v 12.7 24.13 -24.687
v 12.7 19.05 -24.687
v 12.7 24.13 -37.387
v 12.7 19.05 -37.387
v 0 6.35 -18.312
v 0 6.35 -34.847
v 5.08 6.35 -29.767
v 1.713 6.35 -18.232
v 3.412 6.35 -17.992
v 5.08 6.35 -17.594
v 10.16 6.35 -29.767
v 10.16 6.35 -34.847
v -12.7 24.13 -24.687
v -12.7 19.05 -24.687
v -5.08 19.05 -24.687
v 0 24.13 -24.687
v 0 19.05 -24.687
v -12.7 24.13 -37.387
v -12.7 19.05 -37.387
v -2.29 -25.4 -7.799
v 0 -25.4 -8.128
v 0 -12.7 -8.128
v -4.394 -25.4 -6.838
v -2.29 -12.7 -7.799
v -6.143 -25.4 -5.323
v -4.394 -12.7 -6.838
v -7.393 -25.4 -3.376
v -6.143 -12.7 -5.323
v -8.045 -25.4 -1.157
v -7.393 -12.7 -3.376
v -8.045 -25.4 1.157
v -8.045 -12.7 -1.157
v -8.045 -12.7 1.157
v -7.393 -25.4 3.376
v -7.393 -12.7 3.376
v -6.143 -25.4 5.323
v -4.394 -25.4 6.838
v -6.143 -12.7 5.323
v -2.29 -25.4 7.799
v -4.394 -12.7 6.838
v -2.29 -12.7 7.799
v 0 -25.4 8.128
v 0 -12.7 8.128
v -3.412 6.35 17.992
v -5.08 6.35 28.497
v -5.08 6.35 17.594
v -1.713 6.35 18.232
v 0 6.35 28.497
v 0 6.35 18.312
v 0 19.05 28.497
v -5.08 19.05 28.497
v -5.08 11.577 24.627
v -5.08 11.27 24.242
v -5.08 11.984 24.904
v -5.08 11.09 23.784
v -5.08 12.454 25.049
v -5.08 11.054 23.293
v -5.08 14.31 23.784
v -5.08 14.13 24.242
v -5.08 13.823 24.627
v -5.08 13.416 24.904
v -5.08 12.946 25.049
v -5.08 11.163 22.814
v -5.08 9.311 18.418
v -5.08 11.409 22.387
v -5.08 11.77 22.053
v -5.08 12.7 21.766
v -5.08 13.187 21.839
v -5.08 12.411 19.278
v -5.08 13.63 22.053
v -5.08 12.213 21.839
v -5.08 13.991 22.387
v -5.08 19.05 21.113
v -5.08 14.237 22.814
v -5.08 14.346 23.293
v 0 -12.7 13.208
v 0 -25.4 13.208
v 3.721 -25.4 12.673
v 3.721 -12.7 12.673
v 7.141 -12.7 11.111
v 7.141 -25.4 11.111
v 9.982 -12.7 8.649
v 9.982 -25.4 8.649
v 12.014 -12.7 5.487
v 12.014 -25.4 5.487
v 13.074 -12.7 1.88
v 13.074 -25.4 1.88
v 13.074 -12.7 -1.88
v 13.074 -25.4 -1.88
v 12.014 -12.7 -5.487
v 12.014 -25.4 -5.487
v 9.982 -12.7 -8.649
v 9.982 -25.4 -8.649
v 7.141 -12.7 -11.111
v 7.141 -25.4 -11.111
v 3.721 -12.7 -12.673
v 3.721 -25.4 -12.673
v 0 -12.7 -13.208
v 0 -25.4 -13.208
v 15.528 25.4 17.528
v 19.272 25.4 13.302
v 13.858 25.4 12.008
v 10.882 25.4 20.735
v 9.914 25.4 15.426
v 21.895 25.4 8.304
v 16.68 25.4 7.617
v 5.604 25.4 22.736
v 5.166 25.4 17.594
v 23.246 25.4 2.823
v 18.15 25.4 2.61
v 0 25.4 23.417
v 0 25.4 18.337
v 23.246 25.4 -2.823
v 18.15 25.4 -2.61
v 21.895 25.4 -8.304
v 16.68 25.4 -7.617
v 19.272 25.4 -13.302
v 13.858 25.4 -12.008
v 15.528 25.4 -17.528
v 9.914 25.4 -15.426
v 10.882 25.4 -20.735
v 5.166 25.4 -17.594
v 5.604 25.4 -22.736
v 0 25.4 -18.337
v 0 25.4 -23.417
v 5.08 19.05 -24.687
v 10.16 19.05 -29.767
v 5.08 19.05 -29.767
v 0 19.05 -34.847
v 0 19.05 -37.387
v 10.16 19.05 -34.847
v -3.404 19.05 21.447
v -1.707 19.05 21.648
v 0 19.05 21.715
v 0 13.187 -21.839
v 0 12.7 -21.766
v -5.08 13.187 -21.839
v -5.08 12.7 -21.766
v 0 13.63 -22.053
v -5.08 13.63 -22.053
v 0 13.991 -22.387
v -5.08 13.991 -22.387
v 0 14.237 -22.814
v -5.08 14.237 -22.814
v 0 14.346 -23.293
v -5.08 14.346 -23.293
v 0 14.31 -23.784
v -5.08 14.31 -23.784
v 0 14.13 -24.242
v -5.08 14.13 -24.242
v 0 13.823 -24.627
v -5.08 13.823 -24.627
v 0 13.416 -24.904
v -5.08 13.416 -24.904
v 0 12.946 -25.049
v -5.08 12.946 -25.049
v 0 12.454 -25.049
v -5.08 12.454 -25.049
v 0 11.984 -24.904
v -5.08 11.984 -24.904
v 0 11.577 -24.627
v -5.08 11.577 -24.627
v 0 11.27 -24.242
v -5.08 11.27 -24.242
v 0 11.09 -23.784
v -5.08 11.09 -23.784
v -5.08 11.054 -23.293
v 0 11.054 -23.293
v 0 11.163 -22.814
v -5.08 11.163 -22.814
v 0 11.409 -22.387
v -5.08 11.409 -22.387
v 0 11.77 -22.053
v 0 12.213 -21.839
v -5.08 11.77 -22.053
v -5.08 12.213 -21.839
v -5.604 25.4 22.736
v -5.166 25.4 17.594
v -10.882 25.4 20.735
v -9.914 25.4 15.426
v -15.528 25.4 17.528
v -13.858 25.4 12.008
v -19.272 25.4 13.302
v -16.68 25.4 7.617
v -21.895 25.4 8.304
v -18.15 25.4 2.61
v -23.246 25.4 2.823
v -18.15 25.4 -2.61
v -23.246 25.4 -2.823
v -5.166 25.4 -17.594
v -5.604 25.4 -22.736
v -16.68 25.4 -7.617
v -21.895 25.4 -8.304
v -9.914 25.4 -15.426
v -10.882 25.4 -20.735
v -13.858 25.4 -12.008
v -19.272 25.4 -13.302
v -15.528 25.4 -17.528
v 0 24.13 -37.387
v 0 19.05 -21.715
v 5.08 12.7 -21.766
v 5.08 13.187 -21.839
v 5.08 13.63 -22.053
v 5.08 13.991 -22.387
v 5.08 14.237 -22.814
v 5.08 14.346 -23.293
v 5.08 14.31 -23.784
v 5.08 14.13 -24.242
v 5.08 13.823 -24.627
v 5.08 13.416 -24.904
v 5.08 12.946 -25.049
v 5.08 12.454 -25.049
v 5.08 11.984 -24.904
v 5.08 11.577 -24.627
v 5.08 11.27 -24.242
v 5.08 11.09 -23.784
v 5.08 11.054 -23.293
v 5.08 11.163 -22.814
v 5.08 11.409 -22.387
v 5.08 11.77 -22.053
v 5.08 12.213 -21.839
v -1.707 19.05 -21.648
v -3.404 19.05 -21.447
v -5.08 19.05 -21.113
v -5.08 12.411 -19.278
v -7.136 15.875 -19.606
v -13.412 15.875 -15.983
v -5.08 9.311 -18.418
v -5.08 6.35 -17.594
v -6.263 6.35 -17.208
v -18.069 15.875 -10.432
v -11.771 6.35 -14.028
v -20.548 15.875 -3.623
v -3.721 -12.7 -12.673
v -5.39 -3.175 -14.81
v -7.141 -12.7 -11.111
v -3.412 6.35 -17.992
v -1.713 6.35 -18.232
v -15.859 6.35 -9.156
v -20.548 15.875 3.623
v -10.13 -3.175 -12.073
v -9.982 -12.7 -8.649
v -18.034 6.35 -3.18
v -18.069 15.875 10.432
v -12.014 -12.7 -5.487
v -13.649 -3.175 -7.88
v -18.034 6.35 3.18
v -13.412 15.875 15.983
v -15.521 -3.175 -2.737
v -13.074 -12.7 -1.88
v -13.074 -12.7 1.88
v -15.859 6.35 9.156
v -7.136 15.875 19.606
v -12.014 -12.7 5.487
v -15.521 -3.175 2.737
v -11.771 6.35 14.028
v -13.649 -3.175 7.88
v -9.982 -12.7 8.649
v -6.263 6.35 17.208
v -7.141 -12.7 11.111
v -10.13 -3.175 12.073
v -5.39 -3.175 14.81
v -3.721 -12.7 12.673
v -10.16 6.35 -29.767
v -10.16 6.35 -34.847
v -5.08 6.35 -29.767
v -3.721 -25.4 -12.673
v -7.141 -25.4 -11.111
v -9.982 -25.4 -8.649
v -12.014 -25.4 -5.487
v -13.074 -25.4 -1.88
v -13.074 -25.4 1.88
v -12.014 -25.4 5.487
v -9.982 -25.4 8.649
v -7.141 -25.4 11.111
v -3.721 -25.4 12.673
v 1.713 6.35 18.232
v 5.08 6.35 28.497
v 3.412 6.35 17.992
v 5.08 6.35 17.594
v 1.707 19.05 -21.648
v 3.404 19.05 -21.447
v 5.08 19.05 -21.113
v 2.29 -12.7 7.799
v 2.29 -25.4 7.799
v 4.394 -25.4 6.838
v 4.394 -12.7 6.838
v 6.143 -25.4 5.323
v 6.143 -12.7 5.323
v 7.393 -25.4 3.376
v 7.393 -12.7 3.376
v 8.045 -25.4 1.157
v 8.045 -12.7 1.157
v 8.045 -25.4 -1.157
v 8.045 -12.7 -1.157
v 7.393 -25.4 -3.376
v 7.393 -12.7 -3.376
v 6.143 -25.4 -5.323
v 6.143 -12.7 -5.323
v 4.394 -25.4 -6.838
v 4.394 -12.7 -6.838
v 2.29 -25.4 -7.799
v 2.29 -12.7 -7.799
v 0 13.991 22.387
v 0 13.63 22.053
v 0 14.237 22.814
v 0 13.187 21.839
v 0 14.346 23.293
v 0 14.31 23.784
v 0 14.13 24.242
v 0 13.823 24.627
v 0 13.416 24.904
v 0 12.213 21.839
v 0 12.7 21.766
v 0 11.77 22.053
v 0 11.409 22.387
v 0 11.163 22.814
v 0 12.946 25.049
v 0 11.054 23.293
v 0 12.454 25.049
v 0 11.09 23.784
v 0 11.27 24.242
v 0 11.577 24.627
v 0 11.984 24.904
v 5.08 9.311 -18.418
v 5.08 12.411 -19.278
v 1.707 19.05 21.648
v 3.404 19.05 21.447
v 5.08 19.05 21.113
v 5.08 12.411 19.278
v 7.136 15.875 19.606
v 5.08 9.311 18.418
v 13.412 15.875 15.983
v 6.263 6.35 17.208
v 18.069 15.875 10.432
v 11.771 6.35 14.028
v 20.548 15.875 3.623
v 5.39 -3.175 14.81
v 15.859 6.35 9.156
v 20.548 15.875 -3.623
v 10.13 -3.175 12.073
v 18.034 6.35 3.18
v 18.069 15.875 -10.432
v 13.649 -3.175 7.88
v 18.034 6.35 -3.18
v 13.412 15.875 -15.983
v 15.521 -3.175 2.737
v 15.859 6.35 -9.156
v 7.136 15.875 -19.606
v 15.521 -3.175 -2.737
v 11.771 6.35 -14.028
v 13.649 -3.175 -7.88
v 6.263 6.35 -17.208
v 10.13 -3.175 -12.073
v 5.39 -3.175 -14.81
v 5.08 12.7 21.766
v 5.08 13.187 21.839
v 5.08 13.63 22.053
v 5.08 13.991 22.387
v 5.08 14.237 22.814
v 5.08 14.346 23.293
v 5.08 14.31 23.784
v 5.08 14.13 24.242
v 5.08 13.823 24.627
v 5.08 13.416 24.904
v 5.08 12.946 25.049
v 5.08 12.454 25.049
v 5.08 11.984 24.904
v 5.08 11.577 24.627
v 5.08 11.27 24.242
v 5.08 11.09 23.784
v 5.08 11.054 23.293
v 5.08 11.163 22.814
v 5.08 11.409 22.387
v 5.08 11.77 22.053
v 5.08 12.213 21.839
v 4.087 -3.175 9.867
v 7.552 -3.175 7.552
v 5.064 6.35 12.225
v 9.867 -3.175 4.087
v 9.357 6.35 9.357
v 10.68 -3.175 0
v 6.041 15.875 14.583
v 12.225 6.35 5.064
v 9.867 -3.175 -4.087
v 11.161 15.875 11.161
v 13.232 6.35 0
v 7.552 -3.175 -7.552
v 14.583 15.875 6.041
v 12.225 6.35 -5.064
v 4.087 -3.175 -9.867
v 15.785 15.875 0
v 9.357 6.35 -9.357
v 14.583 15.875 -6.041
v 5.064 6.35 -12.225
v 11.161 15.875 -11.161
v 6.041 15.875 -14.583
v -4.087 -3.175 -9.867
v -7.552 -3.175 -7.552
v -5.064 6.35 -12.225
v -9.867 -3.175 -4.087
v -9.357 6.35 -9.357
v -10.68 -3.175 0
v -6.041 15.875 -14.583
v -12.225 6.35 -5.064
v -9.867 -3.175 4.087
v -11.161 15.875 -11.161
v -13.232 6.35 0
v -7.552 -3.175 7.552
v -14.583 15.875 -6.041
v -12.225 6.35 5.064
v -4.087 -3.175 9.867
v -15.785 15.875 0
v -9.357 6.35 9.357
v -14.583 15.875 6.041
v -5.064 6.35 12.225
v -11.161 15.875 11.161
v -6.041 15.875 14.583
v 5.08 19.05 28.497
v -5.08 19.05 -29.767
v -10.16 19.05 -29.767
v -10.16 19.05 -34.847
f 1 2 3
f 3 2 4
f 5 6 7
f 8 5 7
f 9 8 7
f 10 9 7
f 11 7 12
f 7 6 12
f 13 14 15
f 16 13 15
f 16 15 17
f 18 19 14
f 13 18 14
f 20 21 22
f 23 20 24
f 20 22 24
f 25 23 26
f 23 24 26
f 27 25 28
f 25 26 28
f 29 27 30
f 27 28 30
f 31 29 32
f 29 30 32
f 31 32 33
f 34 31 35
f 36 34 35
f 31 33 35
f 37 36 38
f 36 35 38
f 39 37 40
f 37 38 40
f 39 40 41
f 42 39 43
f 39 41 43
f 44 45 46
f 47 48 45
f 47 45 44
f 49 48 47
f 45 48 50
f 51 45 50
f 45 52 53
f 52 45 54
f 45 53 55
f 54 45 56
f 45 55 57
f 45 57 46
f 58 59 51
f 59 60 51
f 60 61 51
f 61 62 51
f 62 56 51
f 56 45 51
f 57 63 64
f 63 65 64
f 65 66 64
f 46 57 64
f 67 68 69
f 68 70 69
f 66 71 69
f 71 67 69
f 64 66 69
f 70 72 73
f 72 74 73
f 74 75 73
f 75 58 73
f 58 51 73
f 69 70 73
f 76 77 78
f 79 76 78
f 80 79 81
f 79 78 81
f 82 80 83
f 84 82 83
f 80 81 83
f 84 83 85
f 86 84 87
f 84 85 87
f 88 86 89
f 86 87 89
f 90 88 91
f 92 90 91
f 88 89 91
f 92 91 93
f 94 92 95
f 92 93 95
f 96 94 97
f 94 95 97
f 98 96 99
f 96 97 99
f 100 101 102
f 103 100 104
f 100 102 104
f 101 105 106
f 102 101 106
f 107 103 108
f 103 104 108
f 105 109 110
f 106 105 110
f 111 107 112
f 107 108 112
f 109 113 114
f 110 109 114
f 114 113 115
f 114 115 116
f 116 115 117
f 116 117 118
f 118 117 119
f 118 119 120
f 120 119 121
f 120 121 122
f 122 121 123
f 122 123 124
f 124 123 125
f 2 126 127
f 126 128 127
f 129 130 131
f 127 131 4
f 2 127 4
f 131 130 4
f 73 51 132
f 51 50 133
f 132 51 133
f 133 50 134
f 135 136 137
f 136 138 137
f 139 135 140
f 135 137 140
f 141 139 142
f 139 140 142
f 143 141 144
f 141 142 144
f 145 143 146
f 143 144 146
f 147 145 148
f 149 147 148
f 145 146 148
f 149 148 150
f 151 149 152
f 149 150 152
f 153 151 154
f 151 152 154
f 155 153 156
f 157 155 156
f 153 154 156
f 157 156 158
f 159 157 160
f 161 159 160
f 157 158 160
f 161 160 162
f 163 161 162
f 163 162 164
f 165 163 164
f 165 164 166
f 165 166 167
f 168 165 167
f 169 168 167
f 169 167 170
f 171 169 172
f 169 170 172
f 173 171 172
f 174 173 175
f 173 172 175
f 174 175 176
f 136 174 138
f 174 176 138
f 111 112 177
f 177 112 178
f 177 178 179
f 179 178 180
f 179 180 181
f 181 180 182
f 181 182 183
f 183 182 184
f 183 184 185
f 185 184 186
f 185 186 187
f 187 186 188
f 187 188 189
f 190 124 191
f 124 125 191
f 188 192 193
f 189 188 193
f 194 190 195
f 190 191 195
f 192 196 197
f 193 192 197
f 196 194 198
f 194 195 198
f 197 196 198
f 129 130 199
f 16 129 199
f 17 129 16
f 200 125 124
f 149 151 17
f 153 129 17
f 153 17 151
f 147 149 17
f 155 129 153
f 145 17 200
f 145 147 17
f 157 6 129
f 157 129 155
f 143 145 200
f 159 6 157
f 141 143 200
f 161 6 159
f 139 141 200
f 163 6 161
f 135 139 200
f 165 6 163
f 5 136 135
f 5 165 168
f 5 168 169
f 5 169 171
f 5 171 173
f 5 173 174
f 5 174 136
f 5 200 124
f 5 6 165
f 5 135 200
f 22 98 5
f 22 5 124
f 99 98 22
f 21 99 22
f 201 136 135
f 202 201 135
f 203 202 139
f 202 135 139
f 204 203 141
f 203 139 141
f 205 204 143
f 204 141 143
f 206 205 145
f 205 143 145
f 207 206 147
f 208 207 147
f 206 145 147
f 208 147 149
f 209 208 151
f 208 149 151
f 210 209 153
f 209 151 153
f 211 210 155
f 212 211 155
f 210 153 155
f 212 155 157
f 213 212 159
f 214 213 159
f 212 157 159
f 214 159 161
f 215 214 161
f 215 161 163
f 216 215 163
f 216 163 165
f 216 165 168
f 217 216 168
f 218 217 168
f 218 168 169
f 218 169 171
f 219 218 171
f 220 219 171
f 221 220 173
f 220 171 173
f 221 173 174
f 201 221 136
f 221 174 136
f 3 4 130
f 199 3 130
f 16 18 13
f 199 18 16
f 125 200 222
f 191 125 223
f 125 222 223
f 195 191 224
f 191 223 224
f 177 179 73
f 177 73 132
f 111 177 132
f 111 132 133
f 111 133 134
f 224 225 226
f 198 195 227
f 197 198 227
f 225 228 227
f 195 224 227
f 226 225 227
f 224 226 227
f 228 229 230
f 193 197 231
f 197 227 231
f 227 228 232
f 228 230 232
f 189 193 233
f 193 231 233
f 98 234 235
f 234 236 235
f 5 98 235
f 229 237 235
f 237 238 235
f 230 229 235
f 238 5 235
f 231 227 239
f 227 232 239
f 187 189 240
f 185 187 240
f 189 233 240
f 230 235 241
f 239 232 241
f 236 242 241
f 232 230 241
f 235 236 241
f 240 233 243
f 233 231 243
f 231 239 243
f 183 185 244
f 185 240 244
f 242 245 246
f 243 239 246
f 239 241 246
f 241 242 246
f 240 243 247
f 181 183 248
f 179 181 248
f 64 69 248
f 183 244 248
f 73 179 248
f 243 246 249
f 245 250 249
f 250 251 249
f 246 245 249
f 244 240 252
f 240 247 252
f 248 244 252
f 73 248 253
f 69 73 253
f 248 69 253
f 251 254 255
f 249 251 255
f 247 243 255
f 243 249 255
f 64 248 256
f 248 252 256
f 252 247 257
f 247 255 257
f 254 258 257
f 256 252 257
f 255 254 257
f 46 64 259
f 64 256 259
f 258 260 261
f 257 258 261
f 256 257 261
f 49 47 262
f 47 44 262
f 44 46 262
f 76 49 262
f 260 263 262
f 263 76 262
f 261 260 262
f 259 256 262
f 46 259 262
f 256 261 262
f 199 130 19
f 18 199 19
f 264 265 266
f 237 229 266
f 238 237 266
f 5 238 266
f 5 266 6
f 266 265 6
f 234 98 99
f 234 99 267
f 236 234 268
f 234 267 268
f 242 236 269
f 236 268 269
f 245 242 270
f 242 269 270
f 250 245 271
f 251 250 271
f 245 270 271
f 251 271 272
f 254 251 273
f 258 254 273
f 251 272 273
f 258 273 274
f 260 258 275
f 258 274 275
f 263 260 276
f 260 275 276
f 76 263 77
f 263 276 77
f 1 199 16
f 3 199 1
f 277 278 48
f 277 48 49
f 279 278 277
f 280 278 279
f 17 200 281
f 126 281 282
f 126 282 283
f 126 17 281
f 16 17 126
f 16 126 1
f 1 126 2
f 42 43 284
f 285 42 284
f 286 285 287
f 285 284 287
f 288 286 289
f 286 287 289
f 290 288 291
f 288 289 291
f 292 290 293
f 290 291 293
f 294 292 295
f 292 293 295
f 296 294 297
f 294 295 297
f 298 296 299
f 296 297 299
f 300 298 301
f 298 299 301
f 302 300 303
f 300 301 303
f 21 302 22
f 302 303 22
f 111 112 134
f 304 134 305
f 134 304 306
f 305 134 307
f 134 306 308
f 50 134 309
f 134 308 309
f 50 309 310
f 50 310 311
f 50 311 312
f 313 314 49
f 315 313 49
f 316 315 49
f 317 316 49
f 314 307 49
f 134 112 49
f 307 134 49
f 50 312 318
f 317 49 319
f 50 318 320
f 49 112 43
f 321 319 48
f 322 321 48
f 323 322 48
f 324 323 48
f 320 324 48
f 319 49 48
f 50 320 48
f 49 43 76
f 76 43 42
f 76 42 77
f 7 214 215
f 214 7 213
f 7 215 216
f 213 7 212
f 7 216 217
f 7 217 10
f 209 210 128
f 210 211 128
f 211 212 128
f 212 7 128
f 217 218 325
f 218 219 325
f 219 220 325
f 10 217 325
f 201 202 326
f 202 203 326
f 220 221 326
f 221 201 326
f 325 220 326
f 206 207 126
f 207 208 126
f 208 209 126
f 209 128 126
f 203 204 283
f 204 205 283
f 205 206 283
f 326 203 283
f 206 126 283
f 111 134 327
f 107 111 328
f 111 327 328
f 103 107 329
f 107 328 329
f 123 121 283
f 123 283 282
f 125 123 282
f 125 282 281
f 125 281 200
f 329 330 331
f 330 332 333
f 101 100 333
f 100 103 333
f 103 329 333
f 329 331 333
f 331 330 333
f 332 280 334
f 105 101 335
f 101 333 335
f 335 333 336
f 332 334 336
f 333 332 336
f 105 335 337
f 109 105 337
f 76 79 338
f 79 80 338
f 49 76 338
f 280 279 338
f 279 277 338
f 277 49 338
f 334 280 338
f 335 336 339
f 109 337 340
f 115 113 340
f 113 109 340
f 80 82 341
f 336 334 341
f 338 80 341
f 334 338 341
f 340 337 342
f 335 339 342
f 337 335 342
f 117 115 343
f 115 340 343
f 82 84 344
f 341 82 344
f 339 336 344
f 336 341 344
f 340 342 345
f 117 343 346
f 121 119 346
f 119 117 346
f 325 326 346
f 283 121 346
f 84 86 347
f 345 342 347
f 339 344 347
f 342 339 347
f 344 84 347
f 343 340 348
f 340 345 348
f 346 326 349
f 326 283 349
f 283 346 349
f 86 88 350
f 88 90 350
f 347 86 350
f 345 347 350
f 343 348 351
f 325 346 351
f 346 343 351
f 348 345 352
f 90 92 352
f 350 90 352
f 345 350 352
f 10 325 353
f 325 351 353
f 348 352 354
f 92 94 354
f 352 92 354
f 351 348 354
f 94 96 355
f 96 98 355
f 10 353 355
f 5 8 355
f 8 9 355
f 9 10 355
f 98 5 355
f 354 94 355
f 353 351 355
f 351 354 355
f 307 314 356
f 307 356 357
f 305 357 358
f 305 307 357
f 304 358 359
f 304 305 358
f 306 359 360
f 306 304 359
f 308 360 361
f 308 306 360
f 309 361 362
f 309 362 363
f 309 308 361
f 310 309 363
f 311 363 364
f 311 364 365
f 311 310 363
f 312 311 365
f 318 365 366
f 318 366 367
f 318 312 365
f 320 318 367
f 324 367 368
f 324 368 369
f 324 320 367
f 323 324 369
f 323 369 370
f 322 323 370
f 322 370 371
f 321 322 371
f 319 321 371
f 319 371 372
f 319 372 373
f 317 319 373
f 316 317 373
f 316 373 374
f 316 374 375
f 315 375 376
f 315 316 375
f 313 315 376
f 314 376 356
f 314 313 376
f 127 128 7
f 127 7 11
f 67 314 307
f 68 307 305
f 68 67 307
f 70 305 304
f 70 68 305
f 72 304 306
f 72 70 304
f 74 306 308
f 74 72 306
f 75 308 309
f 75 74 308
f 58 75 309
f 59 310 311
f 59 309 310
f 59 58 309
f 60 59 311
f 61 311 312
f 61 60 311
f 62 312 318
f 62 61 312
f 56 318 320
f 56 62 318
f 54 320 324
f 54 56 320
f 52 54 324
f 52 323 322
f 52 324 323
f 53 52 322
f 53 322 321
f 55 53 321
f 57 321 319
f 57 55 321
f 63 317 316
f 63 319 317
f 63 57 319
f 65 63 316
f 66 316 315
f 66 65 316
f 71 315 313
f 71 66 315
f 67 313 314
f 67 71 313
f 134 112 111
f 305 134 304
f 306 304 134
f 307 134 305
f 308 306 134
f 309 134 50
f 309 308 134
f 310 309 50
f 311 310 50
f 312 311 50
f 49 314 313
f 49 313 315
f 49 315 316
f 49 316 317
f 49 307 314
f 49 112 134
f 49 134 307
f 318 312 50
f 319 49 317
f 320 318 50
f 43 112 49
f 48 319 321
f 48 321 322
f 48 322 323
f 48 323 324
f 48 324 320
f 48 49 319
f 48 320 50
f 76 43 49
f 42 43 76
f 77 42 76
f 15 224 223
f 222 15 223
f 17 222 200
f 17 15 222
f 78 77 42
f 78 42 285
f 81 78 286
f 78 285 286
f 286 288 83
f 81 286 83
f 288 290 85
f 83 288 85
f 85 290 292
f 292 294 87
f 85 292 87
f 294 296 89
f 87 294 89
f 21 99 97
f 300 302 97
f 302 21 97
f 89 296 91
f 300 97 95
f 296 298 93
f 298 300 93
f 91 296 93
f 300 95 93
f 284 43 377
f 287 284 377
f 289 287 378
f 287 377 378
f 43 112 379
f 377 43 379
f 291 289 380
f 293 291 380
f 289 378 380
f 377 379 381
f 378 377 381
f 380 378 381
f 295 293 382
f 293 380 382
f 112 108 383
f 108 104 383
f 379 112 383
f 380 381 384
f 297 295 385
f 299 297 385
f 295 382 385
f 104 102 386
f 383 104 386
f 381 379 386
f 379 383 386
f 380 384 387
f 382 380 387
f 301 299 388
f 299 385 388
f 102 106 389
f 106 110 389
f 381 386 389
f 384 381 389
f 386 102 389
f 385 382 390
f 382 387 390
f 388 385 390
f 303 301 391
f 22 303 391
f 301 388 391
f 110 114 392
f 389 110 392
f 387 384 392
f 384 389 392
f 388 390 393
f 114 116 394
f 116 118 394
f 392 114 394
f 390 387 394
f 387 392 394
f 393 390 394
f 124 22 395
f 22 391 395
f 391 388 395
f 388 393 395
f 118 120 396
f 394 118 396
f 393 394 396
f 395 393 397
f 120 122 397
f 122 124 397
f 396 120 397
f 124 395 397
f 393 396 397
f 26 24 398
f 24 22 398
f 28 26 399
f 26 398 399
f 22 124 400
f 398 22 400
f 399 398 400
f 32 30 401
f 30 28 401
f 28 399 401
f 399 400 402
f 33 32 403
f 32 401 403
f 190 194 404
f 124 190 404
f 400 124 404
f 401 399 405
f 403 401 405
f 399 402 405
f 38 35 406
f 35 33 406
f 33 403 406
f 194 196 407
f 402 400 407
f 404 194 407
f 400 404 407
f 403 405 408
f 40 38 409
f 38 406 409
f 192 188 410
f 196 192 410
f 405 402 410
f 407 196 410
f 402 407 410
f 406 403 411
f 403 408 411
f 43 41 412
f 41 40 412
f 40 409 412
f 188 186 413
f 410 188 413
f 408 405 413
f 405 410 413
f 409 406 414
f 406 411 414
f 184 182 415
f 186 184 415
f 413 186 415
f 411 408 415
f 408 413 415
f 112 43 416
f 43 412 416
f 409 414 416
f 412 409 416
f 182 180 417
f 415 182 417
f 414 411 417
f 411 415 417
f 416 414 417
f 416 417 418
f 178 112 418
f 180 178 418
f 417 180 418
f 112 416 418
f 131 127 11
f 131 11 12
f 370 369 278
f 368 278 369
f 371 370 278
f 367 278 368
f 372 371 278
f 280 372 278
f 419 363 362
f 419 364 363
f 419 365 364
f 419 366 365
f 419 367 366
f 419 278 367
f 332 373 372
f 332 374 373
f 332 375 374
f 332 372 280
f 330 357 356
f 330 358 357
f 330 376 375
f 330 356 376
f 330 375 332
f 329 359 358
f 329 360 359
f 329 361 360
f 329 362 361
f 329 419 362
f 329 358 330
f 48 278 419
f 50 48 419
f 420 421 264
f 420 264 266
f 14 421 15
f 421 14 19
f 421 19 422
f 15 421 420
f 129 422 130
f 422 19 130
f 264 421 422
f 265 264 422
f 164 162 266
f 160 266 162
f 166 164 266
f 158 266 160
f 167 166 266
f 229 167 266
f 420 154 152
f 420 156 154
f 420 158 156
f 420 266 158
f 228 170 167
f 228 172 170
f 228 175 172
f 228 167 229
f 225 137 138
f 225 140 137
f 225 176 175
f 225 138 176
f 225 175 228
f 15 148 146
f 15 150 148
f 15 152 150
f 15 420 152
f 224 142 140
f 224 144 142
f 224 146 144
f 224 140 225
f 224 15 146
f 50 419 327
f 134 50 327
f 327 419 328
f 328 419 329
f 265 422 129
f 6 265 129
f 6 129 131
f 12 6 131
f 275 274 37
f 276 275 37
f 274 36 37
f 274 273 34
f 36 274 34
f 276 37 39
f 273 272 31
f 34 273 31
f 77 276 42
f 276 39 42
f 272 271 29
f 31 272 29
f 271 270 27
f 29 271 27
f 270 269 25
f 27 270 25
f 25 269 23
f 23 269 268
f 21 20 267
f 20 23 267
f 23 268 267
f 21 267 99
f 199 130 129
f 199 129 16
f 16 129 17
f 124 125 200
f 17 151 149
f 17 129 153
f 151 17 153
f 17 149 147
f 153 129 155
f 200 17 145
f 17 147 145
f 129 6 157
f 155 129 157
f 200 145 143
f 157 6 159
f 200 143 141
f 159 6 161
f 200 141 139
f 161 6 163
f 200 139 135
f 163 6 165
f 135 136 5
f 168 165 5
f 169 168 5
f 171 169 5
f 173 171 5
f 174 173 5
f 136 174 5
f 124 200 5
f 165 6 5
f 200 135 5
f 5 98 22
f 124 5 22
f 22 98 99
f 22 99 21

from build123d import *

# Parameters (mm, degrees)
SKETCH13_W          = 34.9924598
SKETCH13_H          = 12.7
SKETCH13_R          = 1.651
BOSS_EXTRUDE1_DEPTH = 5.08
SKETCH14_W          = 20.32
SKETCH14_H          = 5.08
BOSS_EXTRUDE2_DEPTH = 12.7
SKETCH15_W          = 25.4
SKETCH15_H          = 2.54
BOSS_EXTRUDE3_DEPTH = 5.08
SKETCH16_W          = 6.35
SKETCH16_H          = 12.7
CUT_EXTRUDE6_DEPTH  = 29.496864232


with BuildPart() as part:
    # Sketch1 → Revolve1 (revolve)
    with BuildSketch(Plane.XY):
        Polygon((8.128, -12.7), (18.336864232, 25.4), (23.416864232, 25.4), (13.208, -12.7), (13.208, -25.4), (8.128, -25.4), align=None)
    revolve(axis=Axis((0, 0, 0), (0, 1, 0)))

    # Sketch13 → Boss-Extrude1 (add, symmetric)
    with BuildSketch(Plane(origin=(0, 0, 0), x_dir=(0, 0, -1), z_dir=(1, 0, 0))):
        with Locations((-17.350634332, 12.7)):
            Rectangle(SKETCH13_W, SKETCH13_H)
        with Locations((-23.416864232, 12.7)):
            Circle(SKETCH13_R, mode=Mode.SUBTRACT)
    boss_extrude1 = extrude(amount=BOSS_EXTRUDE1_DEPTH, both=True)

    # Mirror1: Boss-Extrude1 across plane
    add(boss_extrude1.mirror(Plane.XY))

    # Sketch14 → Boss-Extrude2 (add)
    with BuildSketch(Plane(origin=(0, 19.05, 0), x_dir=(1, 0, 0), z_dir=(0, 1, 0))):
        with Locations((0, 32.306864232)):
            Rectangle(SKETCH14_W, SKETCH14_H)
    extrude(amount=-BOSS_EXTRUDE2_DEPTH)

    # Sketch15 → Boss-Extrude3 (add)
    with BuildSketch(Plane(origin=(0, 19.05, 0), x_dir=(1, 0, 0), z_dir=(0, 1, 0))):
        Polygon((5.08, 27.226864232), (7.62, 27.226864232), (12.7, 27.226864232), (12.7, 37.386864232), (-12.7, 37.386864232), (-12.7, 27.226864232), (-7.62, 27.226864232), (-5.08, 27.226864232), (-5.08, 29.766864232), (-10.16, 29.766864232), (-10.16, 34.846864232), (10.16, 34.846864232), (10.16, 29.766864232), (5.08, 29.766864232), align=None)
        Polygon((-5.08, 27.226864232), (5.08, 27.226864232), (5.08, 29.766864232), (10.16, 29.766864232), (10.16, 34.846864232), (-10.16, 34.846864232), (-10.16, 29.766864232), (-5.08, 29.766864232), align=None)
        with Locations((0, 25.956864232)):
            Rectangle(SKETCH15_W, SKETCH15_H)
    extrude(amount=BOSS_EXTRUDE3_DEPTH)

    # Sketch16 → Cut-Extrude6 (cut, through all)
    with BuildSketch(Plane(origin=(5.08, 0, 0), x_dir=(0, 0, -1), z_dir=(1, 0, 0))):
        with Locations((-31.671864232, 12.7)):
            Rectangle(SKETCH16_W, SKETCH16_H)
    extrude(amount=-CUT_EXTRUDE6_DEPTH, mode=Mode.SUBTRACT)

    # Sketch17 → Cut-Revolve1 (revolve, cut)
    with BuildSketch(Plane(origin=(0, 0, 0), x_dir=(0, 0, -1), z_dir=(1, 0, 0))):
        Polygon((-18.336864232, 25.4), (0, 25.4), (0, -12.7), (-8.128, -12.7), align=None)
    revolve(axis=Axis((0, 25.4, 0), (0, 1, 0)), mode=Mode.SUBTRACT)


with BuildPart() as body_2:
    # Split1: the piece on the far side of the plane
    add(part.part)
    split(bisect_by=Plane(origin=(0, 0, 0), x_dir=(0, 0, 1), z_dir=(1, 0, 0)), keep=Keep.BOTTOM)


with BuildPart() as part_1:
    add(part.part)

    # Split1
    split(bisect_by=Plane(origin=(0, 0, 0), x_dir=(0, 0, 1), z_dir=(1, 0, 0)), keep=Keep.TOP)


solid = Compound([body_2.part, part_1.part])
